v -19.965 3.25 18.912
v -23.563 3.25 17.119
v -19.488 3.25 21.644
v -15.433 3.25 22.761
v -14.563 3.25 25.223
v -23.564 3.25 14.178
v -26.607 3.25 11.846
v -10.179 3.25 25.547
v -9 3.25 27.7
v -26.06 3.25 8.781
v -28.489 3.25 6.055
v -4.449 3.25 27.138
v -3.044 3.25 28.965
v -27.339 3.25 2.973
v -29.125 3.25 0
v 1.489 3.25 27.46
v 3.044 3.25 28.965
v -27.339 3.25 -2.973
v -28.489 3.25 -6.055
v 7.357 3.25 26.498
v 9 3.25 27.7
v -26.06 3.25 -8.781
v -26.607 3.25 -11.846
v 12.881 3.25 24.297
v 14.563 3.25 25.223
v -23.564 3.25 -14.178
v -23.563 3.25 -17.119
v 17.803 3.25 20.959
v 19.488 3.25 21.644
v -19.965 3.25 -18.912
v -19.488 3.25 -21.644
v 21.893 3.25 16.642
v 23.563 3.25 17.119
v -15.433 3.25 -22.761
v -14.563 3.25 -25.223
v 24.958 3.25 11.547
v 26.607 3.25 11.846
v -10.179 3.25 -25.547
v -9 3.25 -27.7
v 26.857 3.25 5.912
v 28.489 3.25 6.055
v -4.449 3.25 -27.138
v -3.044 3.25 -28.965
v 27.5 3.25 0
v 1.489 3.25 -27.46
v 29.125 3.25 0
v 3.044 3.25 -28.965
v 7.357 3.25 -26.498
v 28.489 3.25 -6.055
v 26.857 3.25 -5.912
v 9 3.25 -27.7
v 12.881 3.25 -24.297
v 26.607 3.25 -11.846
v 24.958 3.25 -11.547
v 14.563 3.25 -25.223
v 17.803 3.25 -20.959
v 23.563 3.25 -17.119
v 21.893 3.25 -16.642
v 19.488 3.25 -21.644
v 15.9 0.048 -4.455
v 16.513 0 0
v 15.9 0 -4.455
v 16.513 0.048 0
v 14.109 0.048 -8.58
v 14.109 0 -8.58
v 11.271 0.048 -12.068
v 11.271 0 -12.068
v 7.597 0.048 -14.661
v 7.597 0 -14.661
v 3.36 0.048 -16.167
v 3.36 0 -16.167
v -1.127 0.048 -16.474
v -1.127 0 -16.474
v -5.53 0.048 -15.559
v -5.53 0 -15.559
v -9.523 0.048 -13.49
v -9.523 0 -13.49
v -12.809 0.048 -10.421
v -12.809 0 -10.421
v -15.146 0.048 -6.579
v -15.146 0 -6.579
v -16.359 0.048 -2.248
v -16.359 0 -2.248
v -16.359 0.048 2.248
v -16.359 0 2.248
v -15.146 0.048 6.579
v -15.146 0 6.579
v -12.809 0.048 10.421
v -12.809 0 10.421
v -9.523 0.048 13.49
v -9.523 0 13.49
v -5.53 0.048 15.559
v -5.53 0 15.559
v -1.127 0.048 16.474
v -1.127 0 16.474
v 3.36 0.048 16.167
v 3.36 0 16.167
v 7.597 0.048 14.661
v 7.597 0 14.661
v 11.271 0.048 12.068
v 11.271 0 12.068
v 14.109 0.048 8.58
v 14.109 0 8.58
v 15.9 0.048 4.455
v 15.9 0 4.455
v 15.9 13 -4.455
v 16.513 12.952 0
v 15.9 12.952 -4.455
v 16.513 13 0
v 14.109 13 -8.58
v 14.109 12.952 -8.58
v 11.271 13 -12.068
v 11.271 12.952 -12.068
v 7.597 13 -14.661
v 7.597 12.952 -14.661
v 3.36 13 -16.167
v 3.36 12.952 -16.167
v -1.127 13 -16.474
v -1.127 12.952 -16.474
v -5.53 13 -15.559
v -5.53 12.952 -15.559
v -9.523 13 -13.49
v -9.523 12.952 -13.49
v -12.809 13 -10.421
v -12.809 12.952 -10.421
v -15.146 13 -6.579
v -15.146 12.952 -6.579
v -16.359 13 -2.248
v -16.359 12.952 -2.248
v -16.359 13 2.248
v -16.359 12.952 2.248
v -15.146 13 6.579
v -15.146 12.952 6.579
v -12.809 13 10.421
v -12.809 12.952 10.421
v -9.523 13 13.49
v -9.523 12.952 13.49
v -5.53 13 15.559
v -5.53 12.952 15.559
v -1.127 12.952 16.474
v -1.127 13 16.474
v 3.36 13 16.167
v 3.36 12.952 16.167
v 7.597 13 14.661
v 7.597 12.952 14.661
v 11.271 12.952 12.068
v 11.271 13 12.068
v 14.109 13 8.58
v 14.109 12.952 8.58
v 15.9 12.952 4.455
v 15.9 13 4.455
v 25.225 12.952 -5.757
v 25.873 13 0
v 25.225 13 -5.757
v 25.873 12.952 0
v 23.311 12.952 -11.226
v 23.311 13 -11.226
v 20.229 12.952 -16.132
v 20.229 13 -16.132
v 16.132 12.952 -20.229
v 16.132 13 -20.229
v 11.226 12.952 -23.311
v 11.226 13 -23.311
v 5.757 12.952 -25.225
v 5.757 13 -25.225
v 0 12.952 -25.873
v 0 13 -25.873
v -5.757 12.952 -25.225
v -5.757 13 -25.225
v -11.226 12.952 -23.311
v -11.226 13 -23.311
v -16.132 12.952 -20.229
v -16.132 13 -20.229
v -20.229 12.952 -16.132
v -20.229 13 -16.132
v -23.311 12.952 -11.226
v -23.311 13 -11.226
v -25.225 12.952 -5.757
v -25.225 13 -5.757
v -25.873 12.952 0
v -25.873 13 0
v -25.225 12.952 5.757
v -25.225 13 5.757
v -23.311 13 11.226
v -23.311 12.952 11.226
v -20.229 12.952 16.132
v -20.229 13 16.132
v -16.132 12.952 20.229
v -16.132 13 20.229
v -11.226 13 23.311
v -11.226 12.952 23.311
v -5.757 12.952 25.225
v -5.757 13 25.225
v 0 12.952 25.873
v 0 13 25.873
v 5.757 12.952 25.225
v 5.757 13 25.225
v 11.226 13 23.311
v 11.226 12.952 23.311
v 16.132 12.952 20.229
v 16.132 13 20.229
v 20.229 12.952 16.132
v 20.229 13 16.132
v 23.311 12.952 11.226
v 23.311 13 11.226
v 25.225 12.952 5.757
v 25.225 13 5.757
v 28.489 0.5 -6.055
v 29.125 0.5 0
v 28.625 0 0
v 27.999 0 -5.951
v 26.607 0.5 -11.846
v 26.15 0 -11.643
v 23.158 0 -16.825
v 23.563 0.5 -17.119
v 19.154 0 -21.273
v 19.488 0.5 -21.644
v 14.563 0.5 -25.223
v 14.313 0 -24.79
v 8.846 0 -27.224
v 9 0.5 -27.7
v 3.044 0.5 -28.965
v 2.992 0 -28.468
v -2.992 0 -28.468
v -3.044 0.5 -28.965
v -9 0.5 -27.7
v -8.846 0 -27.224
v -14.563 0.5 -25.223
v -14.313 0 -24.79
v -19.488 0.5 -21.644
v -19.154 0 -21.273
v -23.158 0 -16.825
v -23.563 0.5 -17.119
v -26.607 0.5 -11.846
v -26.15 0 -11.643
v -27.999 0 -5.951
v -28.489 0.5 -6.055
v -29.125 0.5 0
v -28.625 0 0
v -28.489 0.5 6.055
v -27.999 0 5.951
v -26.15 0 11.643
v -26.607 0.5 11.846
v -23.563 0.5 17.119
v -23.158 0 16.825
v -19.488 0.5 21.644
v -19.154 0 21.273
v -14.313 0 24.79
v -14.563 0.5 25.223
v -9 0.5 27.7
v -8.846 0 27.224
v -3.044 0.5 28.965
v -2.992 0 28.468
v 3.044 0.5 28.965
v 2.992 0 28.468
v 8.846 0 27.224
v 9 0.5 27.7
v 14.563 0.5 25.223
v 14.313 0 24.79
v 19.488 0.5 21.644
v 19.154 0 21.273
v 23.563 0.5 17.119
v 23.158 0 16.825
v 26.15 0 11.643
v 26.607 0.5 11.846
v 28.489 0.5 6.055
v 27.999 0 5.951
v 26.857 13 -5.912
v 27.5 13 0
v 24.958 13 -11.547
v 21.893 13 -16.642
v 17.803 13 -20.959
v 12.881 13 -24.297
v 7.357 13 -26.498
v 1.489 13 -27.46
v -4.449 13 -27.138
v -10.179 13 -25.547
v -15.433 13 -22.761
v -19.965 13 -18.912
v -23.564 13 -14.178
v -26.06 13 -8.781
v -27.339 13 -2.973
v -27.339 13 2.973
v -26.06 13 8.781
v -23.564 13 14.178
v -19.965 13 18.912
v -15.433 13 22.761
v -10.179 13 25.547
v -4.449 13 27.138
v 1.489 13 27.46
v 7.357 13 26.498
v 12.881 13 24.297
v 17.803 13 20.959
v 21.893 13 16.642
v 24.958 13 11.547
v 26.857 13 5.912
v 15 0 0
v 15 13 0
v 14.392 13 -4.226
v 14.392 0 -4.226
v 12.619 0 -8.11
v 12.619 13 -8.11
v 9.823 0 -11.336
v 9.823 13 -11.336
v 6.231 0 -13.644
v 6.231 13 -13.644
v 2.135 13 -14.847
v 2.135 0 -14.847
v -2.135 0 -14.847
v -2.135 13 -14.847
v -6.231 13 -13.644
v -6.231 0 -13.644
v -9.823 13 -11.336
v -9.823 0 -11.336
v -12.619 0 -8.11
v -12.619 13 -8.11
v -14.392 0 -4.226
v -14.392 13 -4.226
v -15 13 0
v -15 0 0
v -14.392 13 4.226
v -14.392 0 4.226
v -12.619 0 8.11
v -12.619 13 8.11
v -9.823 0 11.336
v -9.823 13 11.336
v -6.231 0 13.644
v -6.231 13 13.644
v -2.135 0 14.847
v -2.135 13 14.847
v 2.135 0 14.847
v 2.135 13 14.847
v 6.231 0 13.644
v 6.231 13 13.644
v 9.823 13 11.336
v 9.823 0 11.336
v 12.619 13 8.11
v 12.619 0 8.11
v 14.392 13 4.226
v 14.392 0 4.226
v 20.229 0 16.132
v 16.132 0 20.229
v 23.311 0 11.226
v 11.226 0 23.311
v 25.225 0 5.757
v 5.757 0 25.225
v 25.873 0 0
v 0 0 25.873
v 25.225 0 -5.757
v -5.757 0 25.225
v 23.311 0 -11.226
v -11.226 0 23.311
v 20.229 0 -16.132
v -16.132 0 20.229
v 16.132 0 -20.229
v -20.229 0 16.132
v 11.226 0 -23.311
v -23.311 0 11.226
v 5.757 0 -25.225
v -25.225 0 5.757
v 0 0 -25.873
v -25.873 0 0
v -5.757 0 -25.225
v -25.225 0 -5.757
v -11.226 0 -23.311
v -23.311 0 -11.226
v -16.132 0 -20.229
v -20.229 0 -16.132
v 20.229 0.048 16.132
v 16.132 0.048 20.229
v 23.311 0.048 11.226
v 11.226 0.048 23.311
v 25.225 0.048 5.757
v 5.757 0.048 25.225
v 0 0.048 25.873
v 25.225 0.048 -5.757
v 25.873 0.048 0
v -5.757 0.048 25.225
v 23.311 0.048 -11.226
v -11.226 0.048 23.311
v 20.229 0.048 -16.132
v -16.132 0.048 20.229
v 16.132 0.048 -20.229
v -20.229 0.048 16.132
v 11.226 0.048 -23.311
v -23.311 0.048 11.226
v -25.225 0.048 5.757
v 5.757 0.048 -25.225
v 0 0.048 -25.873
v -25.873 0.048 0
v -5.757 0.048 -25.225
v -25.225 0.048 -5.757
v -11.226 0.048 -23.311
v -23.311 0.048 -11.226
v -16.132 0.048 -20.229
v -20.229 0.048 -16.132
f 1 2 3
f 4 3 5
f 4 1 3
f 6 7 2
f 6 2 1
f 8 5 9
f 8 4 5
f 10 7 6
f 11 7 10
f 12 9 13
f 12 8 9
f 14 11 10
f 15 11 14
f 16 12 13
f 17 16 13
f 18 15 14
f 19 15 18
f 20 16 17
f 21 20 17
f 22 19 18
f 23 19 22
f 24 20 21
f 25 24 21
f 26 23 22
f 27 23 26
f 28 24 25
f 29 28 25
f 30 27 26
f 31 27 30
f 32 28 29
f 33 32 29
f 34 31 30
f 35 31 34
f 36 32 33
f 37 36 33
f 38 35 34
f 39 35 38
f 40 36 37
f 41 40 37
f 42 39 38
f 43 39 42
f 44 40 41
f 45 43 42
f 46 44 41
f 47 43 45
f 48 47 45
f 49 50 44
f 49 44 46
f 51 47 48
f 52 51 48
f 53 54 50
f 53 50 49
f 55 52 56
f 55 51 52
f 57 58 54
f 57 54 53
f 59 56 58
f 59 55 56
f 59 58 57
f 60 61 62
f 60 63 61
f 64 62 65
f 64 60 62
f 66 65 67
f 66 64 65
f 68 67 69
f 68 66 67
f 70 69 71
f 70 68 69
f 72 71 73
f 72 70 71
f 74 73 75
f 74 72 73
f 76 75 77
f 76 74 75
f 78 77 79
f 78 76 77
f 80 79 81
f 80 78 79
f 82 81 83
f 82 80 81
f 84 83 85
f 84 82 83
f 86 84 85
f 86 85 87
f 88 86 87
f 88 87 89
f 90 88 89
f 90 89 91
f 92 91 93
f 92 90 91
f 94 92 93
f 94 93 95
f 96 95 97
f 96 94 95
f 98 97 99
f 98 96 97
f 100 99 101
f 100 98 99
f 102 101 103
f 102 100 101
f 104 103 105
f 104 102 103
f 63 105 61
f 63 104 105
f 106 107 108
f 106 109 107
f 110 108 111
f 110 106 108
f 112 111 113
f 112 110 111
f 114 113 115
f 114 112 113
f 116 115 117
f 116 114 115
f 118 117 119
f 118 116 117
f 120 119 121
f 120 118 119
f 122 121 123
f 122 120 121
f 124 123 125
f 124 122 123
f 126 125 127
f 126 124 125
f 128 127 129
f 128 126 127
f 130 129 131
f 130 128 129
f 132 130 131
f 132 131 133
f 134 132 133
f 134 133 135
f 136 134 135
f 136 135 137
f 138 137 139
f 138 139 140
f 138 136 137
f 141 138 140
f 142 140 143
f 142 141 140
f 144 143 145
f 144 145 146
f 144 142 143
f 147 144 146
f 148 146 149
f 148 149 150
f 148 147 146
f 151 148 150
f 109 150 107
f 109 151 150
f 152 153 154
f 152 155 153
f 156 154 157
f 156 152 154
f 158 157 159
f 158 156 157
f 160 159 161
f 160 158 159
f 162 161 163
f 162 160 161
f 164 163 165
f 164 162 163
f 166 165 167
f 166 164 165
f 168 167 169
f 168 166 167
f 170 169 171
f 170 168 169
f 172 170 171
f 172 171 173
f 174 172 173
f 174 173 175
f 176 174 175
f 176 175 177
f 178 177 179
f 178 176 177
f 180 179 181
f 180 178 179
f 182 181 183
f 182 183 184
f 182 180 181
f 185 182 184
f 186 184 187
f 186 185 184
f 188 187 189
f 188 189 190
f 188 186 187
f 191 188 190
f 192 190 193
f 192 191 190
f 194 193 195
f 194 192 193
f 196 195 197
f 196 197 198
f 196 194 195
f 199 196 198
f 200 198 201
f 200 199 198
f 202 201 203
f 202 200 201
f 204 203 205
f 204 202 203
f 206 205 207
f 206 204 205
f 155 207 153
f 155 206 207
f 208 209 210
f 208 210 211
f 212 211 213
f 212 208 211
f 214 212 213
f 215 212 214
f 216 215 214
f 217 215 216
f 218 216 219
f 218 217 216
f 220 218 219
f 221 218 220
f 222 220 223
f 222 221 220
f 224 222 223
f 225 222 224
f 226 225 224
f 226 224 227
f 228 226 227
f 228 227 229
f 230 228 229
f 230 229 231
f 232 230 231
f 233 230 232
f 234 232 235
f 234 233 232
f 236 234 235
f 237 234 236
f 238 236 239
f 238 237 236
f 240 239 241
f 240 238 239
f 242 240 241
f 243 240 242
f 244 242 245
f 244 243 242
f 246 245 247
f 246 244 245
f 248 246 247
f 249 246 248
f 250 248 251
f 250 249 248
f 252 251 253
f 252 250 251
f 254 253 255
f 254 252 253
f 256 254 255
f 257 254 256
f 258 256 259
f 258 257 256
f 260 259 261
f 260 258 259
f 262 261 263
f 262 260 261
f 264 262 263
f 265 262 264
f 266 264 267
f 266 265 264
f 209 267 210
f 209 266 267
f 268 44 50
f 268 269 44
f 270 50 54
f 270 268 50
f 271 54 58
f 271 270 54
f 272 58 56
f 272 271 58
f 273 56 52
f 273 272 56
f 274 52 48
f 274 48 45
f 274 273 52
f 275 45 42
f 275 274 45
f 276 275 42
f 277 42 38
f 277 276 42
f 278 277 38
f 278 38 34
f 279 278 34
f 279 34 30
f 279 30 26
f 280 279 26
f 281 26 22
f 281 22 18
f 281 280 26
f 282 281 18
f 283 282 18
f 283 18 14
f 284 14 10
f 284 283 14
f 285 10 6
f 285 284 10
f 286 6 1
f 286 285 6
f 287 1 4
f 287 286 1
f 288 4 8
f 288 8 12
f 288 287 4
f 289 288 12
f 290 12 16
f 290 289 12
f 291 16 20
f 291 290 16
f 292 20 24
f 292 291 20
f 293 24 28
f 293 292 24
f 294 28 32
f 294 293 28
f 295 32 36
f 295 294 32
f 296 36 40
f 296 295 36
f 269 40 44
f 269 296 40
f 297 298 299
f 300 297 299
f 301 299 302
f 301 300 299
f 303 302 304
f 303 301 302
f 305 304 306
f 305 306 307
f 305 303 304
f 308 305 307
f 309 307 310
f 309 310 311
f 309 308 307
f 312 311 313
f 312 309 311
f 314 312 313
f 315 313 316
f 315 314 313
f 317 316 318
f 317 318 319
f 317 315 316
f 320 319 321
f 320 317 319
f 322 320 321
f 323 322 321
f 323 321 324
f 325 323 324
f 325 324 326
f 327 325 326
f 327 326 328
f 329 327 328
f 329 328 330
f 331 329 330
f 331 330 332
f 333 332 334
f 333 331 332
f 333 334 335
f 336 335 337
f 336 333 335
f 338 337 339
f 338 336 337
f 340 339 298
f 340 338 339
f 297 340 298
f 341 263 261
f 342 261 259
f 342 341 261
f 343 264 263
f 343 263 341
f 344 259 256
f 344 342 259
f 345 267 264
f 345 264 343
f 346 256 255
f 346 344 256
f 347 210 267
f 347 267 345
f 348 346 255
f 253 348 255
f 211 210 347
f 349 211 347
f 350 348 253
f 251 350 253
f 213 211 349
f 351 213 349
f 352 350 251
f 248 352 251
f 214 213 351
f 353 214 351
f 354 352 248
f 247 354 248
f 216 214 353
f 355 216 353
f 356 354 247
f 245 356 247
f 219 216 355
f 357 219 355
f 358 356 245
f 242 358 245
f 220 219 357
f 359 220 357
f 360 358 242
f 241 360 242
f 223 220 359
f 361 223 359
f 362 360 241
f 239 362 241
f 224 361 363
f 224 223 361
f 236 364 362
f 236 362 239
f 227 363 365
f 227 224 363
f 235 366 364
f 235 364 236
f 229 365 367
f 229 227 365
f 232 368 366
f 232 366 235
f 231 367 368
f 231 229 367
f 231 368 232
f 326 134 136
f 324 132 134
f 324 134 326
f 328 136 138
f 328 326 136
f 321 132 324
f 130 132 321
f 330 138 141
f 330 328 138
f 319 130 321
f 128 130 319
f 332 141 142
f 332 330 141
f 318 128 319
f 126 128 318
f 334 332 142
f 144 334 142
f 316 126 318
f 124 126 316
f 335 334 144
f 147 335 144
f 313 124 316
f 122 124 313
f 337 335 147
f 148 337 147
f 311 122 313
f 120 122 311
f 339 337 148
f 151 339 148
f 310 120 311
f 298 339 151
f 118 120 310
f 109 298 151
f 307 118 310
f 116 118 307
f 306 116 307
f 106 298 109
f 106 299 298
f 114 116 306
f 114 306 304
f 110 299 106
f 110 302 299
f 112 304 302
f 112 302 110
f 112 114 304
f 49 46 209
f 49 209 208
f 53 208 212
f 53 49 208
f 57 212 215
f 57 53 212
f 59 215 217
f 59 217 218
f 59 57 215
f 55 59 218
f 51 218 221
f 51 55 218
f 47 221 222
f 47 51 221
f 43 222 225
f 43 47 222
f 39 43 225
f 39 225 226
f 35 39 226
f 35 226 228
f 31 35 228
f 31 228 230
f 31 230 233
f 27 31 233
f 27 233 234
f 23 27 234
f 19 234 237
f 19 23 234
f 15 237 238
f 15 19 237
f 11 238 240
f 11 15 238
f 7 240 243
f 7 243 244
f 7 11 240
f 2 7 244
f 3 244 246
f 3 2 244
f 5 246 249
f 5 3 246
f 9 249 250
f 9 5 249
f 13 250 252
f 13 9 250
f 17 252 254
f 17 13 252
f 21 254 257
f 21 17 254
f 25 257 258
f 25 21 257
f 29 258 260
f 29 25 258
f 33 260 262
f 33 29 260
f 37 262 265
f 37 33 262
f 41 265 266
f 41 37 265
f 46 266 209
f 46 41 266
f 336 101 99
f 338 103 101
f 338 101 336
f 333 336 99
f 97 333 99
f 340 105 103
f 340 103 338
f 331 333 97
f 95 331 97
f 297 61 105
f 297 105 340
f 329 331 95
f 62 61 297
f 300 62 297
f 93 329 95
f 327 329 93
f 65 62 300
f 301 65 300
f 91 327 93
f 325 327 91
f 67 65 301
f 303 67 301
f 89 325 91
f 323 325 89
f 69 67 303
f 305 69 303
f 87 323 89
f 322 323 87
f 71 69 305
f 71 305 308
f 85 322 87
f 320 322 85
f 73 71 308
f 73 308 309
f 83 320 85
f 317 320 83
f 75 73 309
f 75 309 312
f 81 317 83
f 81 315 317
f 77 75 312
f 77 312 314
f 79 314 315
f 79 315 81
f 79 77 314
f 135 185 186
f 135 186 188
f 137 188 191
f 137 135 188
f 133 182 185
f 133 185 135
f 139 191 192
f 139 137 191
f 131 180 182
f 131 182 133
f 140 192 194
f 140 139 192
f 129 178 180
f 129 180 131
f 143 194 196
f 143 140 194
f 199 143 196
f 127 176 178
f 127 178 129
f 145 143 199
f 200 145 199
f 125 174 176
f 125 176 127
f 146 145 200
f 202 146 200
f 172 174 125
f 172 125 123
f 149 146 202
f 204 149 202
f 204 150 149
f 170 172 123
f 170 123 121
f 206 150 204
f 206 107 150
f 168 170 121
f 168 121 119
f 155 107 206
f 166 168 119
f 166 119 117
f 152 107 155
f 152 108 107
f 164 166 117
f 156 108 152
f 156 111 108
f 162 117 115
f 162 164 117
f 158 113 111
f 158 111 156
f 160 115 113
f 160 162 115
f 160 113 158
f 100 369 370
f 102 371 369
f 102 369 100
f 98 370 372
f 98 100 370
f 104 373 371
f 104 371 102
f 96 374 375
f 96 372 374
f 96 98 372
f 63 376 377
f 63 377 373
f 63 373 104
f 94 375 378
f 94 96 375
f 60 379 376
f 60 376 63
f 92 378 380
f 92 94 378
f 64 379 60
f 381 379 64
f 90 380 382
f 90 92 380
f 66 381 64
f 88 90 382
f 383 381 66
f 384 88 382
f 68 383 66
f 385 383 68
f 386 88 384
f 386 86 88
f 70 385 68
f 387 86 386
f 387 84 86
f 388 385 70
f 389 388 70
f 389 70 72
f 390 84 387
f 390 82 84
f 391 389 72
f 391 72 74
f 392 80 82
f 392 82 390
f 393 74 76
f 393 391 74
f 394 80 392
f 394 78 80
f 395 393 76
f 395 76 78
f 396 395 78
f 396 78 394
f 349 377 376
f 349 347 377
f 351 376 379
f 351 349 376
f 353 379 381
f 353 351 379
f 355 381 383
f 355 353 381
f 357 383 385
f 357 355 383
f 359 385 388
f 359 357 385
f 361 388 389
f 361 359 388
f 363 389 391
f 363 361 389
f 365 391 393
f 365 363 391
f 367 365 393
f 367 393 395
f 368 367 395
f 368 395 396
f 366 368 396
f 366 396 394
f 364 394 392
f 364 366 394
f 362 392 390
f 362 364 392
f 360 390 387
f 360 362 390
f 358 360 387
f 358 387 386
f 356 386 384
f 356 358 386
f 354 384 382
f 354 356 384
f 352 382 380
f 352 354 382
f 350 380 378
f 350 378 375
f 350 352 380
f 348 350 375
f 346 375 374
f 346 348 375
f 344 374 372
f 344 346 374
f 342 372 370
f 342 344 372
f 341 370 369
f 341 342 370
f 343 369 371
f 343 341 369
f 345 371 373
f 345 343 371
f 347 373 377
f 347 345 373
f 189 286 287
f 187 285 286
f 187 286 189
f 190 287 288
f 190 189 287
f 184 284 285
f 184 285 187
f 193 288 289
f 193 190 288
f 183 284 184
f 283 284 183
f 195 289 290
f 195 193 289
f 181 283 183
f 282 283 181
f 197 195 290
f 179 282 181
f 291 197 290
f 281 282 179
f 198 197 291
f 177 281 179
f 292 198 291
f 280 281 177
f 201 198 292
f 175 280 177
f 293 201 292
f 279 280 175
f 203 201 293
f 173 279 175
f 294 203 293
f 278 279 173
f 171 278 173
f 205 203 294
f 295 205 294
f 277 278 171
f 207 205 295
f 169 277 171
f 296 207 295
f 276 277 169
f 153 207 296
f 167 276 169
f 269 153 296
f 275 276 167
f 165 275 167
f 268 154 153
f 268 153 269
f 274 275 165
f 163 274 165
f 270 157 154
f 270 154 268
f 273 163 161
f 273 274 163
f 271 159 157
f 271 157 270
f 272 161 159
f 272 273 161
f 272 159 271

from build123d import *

# Parameters (mm, degrees)
CHAMFER1_SIZE = 0.5


with BuildPart() as part:
    # Sketch1 → Revolve1 (revolve)
    with BuildSketch(Plane.XY):
        Polygon((15, 0), (16.512706206, 0), (16.512706206, 0.048438063), (25.873387513, 0.048438063), (25.873387513, 0), (29.125, 0), (29.125, 3.25), (27.5, 3.25), (27.5, 13), (25.873387513, 13), (25.873387513, 12.951561937), (16.512706206, 12.951561937), (16.512706206, 13), (15, 13), align=None)
    revolve(axis=Axis((0, 0, 0), (0, 1, 0)))

    # Chamfer1
    chamfer1_edges = [part.edges().sort_by_distance(p)[0] for p in [
        (-29.125, 0, 0),
    ]]
    chamfer(chamfer1_edges, length=CHAMFER1_SIZE)


solid = part.part
